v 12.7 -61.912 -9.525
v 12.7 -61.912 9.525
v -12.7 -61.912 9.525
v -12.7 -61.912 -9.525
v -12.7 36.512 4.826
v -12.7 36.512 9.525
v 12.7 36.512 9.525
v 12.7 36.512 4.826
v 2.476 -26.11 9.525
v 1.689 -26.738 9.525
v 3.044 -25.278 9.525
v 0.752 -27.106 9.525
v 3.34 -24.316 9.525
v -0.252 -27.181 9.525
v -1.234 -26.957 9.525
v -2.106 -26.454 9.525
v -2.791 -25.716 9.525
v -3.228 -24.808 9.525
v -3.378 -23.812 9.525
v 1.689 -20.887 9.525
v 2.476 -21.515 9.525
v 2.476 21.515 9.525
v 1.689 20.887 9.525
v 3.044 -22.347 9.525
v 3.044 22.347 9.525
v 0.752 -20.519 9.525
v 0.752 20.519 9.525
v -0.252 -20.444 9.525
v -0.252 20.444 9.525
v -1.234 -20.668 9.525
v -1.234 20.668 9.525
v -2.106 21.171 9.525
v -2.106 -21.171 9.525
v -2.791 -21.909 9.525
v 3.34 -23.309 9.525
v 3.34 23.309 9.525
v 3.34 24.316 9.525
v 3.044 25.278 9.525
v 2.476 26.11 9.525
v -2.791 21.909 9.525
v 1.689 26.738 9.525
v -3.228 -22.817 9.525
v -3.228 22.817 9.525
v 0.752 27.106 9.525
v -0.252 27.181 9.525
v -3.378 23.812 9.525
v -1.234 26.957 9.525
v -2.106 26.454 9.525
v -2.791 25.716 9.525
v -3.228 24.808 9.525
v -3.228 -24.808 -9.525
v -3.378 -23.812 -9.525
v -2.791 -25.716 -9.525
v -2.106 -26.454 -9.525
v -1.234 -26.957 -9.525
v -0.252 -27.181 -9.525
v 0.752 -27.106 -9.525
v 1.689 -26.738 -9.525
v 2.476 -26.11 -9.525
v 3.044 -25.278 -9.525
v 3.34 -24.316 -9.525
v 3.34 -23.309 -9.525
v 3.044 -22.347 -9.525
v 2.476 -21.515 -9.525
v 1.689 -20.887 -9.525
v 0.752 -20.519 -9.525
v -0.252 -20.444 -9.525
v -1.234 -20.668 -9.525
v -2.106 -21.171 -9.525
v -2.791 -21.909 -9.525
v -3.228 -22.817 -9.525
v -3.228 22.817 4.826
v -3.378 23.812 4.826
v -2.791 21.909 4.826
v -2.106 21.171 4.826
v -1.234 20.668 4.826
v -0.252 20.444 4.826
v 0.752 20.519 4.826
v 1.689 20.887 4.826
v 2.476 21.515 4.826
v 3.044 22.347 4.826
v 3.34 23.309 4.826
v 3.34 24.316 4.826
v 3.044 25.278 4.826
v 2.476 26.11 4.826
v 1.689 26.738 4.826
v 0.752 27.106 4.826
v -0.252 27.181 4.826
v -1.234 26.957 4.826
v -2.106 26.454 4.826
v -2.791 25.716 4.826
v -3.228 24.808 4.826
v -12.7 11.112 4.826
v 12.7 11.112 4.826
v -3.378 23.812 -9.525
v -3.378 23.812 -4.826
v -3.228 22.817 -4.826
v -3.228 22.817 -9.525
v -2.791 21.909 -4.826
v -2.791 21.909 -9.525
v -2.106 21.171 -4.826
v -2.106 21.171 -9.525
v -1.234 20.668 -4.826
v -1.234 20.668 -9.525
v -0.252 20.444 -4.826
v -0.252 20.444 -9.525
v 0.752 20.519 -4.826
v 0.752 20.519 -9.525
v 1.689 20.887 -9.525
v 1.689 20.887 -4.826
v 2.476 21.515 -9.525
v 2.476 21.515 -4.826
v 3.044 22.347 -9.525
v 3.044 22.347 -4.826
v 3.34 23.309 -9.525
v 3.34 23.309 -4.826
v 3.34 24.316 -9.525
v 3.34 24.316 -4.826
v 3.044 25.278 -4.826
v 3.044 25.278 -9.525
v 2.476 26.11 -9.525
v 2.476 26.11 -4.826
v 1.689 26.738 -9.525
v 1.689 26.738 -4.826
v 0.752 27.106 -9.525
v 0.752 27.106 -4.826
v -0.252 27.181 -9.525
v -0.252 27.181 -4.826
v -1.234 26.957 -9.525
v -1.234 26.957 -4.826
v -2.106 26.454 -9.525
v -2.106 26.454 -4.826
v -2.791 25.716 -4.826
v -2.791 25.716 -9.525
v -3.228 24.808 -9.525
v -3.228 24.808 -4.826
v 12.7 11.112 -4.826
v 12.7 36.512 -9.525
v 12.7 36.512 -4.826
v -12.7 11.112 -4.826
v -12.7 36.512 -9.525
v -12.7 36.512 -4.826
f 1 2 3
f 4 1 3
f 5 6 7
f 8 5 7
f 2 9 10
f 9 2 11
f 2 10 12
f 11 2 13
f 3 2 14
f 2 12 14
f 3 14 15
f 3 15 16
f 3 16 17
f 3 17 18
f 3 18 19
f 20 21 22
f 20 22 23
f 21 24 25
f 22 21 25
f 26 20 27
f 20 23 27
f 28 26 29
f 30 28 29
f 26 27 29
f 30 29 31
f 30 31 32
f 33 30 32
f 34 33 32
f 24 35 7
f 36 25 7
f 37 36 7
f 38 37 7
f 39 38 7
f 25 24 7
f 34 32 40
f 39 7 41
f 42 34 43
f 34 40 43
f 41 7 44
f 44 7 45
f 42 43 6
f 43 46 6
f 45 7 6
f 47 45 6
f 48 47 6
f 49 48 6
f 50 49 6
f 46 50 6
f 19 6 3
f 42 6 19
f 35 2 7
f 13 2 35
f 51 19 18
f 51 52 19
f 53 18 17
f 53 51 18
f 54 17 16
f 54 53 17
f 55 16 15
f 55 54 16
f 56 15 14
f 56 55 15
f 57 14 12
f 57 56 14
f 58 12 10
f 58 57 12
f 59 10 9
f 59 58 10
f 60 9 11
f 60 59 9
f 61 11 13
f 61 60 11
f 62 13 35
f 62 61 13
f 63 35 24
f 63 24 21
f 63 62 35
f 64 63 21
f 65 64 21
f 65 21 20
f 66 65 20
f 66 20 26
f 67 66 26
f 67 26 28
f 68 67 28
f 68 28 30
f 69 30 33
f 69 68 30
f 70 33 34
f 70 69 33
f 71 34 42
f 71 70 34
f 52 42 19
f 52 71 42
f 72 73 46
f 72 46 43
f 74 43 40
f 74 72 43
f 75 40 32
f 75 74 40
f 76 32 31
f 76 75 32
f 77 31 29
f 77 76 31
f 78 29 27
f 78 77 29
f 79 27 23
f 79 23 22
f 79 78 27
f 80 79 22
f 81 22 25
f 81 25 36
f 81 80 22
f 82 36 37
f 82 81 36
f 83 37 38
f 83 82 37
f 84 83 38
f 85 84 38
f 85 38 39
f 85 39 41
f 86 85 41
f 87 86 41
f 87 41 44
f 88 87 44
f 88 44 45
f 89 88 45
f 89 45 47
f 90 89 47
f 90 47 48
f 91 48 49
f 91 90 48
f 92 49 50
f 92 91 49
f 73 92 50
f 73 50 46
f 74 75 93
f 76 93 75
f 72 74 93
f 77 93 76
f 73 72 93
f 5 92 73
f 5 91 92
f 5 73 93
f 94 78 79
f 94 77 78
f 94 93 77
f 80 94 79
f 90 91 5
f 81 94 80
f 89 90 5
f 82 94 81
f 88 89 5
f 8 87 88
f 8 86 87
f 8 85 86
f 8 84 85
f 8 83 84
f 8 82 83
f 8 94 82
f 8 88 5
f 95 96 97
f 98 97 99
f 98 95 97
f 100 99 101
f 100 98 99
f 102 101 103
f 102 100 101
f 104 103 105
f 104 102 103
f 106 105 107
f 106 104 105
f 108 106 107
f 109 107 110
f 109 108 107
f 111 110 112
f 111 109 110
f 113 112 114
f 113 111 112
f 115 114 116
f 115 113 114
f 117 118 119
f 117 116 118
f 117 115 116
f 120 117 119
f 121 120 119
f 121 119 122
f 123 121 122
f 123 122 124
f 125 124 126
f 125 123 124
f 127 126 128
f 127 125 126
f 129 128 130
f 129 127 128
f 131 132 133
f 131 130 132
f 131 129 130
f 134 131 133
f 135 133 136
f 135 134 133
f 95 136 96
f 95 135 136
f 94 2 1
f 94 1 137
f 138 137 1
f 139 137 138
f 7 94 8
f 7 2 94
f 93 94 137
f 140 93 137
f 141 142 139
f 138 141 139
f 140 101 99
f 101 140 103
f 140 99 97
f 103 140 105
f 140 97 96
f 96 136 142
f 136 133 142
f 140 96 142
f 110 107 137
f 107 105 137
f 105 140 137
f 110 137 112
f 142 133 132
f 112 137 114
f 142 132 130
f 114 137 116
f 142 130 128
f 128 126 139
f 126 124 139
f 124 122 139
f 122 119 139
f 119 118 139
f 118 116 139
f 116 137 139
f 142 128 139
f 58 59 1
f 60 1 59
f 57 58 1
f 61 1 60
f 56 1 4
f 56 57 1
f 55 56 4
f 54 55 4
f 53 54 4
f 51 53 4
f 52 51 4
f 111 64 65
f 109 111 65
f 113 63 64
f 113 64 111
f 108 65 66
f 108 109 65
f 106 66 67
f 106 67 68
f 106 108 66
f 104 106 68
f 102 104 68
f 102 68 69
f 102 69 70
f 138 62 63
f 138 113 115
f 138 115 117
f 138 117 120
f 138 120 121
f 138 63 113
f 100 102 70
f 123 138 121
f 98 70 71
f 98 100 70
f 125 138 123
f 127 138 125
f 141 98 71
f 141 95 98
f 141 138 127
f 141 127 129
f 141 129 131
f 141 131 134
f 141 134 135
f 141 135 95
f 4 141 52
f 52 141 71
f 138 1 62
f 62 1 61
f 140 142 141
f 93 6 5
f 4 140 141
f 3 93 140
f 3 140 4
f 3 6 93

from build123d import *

# Parameters (mm, degrees)
SKETCH1_R           = 3.3782
BOSS_EXTRUDE1_DEPTH = 9.525
SKETCH3_W           = 9.652
SKETCH3_H           = 25.4
CUT_EXTRUDE1_DEPTH  = 68.594698618


with BuildPart() as part:
    # Sketch1 → Boss-Extrude1 (new, symmetric)
    with BuildSketch(Plane.XY):
        Polygon((-12.7, 23.8125), (-12.7, 36.5125), (12.7, 36.5125), (12.7, 23.8125), (12.7, -61.9125), (-12.7, -61.9125), align=None)
        with Locations(Location((0, 23.8125, 0), (0, 0, 180))):
            Circle(SKETCH1_R, mode=Mode.SUBTRACT)
        with Locations(Location((0, -23.8125, 0), (0, 0, 180))):
            Circle(SKETCH1_R, mode=Mode.SUBTRACT)
    extrude(amount=BOSS_EXTRUDE1_DEPTH, both=True)

    # Sketch3 → Cut-Extrude1 (cut, through all)
    with BuildSketch(Plane(origin=(12.7, 0, 0), x_dir=(0, 0, -1), z_dir=(1, 0, 0))):
        with Locations((0, 23.8125)):
            Rectangle(SKETCH3_W, SKETCH3_H)
    extrude(amount=-CUT_EXTRUDE1_DEPTH, mode=Mode.SUBTRACT)


solid = part.part
